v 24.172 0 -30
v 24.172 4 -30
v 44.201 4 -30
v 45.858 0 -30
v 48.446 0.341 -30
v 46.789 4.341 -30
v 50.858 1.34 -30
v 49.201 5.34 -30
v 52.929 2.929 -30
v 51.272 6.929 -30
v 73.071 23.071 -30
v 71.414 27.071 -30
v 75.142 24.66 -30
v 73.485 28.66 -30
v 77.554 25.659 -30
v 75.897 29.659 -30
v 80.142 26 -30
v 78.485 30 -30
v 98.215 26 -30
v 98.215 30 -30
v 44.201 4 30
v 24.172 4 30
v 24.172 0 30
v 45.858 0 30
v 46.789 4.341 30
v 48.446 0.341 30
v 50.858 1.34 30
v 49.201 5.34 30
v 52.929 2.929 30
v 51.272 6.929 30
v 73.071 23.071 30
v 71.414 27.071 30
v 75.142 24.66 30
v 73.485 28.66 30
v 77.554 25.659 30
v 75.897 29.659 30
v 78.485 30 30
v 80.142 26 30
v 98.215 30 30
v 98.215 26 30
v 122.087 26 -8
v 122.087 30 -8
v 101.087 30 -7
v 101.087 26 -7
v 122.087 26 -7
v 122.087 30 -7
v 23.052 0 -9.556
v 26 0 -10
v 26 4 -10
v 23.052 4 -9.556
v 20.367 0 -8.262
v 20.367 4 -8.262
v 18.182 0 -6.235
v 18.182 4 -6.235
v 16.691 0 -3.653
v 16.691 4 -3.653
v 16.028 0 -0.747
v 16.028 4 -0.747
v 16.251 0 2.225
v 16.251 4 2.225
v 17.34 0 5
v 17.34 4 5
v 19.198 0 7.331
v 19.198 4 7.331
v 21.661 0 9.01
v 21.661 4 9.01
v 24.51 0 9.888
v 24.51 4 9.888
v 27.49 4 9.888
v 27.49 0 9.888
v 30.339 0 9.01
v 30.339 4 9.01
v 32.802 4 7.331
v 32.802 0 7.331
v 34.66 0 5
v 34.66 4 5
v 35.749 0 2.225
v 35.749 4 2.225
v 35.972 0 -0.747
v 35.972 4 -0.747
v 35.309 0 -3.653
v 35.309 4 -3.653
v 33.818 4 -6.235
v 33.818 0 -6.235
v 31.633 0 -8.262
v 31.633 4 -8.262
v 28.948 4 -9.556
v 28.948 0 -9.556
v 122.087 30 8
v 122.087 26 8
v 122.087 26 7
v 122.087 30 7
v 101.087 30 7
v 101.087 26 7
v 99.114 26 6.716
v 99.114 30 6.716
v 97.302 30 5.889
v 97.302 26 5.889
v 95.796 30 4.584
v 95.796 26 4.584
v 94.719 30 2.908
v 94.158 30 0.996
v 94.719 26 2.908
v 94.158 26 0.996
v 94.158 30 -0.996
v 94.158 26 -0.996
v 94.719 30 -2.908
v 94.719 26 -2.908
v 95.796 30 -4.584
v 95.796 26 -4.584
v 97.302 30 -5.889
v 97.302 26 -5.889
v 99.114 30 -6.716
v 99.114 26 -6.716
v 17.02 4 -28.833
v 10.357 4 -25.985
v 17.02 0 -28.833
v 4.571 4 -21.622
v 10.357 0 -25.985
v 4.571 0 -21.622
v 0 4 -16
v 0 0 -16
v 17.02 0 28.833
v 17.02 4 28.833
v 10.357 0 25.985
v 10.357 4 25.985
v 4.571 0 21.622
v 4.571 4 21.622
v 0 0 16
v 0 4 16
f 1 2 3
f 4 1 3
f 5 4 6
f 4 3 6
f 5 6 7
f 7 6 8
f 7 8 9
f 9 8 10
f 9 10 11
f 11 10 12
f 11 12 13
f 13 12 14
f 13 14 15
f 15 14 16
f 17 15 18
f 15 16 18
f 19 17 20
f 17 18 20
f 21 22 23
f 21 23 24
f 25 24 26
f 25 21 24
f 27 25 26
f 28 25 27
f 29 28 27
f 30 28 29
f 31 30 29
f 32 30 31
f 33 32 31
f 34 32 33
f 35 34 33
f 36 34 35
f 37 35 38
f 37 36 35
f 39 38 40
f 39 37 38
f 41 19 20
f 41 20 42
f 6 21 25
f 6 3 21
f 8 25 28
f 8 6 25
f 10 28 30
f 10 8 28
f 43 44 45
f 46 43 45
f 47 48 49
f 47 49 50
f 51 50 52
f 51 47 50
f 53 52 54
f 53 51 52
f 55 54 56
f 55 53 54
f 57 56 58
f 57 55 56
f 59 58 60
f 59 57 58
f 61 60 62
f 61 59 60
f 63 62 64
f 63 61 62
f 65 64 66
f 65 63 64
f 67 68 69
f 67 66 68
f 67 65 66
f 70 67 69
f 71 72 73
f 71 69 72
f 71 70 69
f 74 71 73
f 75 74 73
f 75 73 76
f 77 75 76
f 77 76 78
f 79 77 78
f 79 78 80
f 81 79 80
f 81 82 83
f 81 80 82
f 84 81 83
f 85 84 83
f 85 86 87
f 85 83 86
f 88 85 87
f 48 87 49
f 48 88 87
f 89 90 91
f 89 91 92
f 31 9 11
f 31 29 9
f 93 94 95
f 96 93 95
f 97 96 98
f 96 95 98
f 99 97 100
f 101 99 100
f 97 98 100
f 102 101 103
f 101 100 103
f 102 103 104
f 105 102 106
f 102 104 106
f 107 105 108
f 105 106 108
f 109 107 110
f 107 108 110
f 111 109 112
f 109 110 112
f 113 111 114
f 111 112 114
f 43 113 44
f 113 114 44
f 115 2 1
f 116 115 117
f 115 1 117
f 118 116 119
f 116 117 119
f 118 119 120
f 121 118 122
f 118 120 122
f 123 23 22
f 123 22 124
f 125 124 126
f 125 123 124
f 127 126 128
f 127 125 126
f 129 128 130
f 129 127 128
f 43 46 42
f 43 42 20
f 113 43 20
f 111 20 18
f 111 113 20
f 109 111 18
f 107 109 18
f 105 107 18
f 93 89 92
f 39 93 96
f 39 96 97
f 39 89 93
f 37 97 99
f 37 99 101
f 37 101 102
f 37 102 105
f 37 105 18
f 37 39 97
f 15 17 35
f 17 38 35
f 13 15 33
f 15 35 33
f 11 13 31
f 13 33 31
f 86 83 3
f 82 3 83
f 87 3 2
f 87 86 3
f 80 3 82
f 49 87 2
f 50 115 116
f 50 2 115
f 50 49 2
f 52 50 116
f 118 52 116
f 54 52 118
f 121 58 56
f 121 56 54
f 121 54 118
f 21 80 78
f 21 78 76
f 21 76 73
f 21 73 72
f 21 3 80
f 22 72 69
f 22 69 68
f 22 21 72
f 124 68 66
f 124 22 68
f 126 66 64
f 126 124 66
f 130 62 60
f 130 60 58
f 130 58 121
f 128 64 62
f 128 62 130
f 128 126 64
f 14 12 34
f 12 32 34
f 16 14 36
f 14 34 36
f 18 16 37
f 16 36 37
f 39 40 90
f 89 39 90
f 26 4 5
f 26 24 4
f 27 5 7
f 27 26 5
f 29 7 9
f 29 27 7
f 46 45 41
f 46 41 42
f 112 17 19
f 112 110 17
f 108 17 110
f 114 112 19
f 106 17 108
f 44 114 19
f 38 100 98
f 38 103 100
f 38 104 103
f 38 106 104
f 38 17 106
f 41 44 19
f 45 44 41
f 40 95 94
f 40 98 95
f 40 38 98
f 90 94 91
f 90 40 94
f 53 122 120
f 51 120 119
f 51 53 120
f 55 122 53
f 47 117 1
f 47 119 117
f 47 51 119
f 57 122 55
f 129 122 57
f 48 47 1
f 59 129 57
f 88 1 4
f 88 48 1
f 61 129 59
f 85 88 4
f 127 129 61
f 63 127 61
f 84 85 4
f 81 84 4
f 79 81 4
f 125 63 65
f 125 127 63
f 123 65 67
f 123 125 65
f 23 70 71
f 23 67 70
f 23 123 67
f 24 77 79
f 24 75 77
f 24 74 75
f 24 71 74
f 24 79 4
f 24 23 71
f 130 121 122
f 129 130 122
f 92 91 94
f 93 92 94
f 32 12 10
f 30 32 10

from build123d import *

# Parameters (mm, degrees)
SALIENTE_EXTRUIR1_DEPTH    = 30
CORTAR_EXTRUIR2_DEPTH      = 32
CORTAR_EXTRUIR2_DEPTH_BACK = 9
CROQUIS2_R                 = 10
CORTAR_EXTRUIR3_DEPTH      = 90
CORTAR_EXTRUIR4_DEPTH      = 130.248290693
CORTAR_EXTRUIR5_DEPTH      = 130.248290693
REDONDEO2_R                = 10
REDONDEO3_R                = 10
REDONDEO4_R                = 10


with BuildPart() as part:
    # Croquis1 → Saliente-Extruir1 (new, symmetric)
    with BuildSketch(Plane.XY):
        Polygon((0, 0), (50, 0), (76, 26), (122.086529343, 26), (122.086529343, 30), (74.343145751, 30), (48.343145751, 4), (0, 4), align=None)
    extrude(amount=SALIENTE_EXTRUIR1_DEPTH, both=True)

    # Croquis2 → Cortar-Extruir2 (cut, two sides: drawn at the far end of the back side and taken through both)
    with BuildSketch(Plane(origin=(0, 0, 0), x_dir=(1, 0, 0), z_dir=(0, 1, 0)).offset(-CORTAR_EXTRUIR2_DEPTH_BACK)):
        with Locations(Location((26, 0, 0), (0, 0, 90))):
            Circle(CROQUIS2_R)
    extrude(amount=CORTAR_EXTRUIR2_DEPTH + CORTAR_EXTRUIR2_DEPTH_BACK, mode=Mode.SUBTRACT)

    # Croquis3 → Cortar-Extruir3 (cut)
    with BuildSketch(Plane(origin=(0, 0, 0), x_dir=(1, 0, 0), z_dir=(0, 1, 0))):
        with BuildLine():
            Line((122.086529343, -7), (101.086529343, -7))
            ThreePointArc((101.086529343, -7), (94.086529343, 0), (101.086529343, 7))
            Line((101.086529343, 7), (122.086529343, 7))
            ThreePointArc((122.086529343, 7), (129.086529343, 0), (122.086529343, -7))
        make_face()
    extrude(amount=CORTAR_EXTRUIR3_DEPTH, mode=Mode.SUBTRACT)

    # Croquis4 → Cortar-Extruir4 (cut, through all)
    with BuildSketch(Plane(origin=(0, 0, 0), x_dir=(1, 0, 0), z_dir=(0, 1, 0))):
        Polygon((98.214837547, 30), (122.086529343, 8), (122.086529343, 30), align=None)
    cortar_extruir4 = extrude(amount=CORTAR_EXTRUIR4_DEPTH, mode=Mode.SUBTRACT)

    # Simetría1: Cortar-Extruir4 across plane
    add(cortar_extruir4.mirror(Plane.XY), mode=Mode.SUBTRACT)

    # Croquis5 → Cortar-Extruir5 (cut, through all)
    with BuildSketch(Plane(origin=(0, 0, 0), x_dir=(1, 0, 0), z_dir=(0, 1, 0))):
        with BuildLine():
            Line((0, 30), (24.171572875, 30))
            ThreePointArc((24.171572875, 30), (10.356957759, 25.984893458), (0, 16))
            Line((0, 16), (0, 30))
        make_face()
    cortar_extruir5 = extrude(amount=CORTAR_EXTRUIR5_DEPTH, mode=Mode.SUBTRACT)

    # Simetría2: Cortar-Extruir5 across plane
    add(cortar_extruir5.mirror(Plane.XY), mode=Mode.SUBTRACT)

    # Redondeo2
    redondeo2_edges = [part.edges().sort_by_distance(p)[0] for p in [
        (48.343145751, 4, 0),
    ]]
    fillet(redondeo2_edges, radius=REDONDEO2_R)

    # Redondeo3
    redondeo3_edges = [part.edges().sort_by_distance(p)[0] for p in [
        (74.343145751, 30, 0),
    ]]
    fillet(redondeo3_edges, radius=REDONDEO3_R)

    # Redondeo4
    redondeo4_edges = [part.edges().sort_by_distance(p)[0] for p in [
        (76, 26, 0),
        (50, 0, 0),
    ]]
    fillet(redondeo4_edges, radius=REDONDEO4_R)


solid = part.part
